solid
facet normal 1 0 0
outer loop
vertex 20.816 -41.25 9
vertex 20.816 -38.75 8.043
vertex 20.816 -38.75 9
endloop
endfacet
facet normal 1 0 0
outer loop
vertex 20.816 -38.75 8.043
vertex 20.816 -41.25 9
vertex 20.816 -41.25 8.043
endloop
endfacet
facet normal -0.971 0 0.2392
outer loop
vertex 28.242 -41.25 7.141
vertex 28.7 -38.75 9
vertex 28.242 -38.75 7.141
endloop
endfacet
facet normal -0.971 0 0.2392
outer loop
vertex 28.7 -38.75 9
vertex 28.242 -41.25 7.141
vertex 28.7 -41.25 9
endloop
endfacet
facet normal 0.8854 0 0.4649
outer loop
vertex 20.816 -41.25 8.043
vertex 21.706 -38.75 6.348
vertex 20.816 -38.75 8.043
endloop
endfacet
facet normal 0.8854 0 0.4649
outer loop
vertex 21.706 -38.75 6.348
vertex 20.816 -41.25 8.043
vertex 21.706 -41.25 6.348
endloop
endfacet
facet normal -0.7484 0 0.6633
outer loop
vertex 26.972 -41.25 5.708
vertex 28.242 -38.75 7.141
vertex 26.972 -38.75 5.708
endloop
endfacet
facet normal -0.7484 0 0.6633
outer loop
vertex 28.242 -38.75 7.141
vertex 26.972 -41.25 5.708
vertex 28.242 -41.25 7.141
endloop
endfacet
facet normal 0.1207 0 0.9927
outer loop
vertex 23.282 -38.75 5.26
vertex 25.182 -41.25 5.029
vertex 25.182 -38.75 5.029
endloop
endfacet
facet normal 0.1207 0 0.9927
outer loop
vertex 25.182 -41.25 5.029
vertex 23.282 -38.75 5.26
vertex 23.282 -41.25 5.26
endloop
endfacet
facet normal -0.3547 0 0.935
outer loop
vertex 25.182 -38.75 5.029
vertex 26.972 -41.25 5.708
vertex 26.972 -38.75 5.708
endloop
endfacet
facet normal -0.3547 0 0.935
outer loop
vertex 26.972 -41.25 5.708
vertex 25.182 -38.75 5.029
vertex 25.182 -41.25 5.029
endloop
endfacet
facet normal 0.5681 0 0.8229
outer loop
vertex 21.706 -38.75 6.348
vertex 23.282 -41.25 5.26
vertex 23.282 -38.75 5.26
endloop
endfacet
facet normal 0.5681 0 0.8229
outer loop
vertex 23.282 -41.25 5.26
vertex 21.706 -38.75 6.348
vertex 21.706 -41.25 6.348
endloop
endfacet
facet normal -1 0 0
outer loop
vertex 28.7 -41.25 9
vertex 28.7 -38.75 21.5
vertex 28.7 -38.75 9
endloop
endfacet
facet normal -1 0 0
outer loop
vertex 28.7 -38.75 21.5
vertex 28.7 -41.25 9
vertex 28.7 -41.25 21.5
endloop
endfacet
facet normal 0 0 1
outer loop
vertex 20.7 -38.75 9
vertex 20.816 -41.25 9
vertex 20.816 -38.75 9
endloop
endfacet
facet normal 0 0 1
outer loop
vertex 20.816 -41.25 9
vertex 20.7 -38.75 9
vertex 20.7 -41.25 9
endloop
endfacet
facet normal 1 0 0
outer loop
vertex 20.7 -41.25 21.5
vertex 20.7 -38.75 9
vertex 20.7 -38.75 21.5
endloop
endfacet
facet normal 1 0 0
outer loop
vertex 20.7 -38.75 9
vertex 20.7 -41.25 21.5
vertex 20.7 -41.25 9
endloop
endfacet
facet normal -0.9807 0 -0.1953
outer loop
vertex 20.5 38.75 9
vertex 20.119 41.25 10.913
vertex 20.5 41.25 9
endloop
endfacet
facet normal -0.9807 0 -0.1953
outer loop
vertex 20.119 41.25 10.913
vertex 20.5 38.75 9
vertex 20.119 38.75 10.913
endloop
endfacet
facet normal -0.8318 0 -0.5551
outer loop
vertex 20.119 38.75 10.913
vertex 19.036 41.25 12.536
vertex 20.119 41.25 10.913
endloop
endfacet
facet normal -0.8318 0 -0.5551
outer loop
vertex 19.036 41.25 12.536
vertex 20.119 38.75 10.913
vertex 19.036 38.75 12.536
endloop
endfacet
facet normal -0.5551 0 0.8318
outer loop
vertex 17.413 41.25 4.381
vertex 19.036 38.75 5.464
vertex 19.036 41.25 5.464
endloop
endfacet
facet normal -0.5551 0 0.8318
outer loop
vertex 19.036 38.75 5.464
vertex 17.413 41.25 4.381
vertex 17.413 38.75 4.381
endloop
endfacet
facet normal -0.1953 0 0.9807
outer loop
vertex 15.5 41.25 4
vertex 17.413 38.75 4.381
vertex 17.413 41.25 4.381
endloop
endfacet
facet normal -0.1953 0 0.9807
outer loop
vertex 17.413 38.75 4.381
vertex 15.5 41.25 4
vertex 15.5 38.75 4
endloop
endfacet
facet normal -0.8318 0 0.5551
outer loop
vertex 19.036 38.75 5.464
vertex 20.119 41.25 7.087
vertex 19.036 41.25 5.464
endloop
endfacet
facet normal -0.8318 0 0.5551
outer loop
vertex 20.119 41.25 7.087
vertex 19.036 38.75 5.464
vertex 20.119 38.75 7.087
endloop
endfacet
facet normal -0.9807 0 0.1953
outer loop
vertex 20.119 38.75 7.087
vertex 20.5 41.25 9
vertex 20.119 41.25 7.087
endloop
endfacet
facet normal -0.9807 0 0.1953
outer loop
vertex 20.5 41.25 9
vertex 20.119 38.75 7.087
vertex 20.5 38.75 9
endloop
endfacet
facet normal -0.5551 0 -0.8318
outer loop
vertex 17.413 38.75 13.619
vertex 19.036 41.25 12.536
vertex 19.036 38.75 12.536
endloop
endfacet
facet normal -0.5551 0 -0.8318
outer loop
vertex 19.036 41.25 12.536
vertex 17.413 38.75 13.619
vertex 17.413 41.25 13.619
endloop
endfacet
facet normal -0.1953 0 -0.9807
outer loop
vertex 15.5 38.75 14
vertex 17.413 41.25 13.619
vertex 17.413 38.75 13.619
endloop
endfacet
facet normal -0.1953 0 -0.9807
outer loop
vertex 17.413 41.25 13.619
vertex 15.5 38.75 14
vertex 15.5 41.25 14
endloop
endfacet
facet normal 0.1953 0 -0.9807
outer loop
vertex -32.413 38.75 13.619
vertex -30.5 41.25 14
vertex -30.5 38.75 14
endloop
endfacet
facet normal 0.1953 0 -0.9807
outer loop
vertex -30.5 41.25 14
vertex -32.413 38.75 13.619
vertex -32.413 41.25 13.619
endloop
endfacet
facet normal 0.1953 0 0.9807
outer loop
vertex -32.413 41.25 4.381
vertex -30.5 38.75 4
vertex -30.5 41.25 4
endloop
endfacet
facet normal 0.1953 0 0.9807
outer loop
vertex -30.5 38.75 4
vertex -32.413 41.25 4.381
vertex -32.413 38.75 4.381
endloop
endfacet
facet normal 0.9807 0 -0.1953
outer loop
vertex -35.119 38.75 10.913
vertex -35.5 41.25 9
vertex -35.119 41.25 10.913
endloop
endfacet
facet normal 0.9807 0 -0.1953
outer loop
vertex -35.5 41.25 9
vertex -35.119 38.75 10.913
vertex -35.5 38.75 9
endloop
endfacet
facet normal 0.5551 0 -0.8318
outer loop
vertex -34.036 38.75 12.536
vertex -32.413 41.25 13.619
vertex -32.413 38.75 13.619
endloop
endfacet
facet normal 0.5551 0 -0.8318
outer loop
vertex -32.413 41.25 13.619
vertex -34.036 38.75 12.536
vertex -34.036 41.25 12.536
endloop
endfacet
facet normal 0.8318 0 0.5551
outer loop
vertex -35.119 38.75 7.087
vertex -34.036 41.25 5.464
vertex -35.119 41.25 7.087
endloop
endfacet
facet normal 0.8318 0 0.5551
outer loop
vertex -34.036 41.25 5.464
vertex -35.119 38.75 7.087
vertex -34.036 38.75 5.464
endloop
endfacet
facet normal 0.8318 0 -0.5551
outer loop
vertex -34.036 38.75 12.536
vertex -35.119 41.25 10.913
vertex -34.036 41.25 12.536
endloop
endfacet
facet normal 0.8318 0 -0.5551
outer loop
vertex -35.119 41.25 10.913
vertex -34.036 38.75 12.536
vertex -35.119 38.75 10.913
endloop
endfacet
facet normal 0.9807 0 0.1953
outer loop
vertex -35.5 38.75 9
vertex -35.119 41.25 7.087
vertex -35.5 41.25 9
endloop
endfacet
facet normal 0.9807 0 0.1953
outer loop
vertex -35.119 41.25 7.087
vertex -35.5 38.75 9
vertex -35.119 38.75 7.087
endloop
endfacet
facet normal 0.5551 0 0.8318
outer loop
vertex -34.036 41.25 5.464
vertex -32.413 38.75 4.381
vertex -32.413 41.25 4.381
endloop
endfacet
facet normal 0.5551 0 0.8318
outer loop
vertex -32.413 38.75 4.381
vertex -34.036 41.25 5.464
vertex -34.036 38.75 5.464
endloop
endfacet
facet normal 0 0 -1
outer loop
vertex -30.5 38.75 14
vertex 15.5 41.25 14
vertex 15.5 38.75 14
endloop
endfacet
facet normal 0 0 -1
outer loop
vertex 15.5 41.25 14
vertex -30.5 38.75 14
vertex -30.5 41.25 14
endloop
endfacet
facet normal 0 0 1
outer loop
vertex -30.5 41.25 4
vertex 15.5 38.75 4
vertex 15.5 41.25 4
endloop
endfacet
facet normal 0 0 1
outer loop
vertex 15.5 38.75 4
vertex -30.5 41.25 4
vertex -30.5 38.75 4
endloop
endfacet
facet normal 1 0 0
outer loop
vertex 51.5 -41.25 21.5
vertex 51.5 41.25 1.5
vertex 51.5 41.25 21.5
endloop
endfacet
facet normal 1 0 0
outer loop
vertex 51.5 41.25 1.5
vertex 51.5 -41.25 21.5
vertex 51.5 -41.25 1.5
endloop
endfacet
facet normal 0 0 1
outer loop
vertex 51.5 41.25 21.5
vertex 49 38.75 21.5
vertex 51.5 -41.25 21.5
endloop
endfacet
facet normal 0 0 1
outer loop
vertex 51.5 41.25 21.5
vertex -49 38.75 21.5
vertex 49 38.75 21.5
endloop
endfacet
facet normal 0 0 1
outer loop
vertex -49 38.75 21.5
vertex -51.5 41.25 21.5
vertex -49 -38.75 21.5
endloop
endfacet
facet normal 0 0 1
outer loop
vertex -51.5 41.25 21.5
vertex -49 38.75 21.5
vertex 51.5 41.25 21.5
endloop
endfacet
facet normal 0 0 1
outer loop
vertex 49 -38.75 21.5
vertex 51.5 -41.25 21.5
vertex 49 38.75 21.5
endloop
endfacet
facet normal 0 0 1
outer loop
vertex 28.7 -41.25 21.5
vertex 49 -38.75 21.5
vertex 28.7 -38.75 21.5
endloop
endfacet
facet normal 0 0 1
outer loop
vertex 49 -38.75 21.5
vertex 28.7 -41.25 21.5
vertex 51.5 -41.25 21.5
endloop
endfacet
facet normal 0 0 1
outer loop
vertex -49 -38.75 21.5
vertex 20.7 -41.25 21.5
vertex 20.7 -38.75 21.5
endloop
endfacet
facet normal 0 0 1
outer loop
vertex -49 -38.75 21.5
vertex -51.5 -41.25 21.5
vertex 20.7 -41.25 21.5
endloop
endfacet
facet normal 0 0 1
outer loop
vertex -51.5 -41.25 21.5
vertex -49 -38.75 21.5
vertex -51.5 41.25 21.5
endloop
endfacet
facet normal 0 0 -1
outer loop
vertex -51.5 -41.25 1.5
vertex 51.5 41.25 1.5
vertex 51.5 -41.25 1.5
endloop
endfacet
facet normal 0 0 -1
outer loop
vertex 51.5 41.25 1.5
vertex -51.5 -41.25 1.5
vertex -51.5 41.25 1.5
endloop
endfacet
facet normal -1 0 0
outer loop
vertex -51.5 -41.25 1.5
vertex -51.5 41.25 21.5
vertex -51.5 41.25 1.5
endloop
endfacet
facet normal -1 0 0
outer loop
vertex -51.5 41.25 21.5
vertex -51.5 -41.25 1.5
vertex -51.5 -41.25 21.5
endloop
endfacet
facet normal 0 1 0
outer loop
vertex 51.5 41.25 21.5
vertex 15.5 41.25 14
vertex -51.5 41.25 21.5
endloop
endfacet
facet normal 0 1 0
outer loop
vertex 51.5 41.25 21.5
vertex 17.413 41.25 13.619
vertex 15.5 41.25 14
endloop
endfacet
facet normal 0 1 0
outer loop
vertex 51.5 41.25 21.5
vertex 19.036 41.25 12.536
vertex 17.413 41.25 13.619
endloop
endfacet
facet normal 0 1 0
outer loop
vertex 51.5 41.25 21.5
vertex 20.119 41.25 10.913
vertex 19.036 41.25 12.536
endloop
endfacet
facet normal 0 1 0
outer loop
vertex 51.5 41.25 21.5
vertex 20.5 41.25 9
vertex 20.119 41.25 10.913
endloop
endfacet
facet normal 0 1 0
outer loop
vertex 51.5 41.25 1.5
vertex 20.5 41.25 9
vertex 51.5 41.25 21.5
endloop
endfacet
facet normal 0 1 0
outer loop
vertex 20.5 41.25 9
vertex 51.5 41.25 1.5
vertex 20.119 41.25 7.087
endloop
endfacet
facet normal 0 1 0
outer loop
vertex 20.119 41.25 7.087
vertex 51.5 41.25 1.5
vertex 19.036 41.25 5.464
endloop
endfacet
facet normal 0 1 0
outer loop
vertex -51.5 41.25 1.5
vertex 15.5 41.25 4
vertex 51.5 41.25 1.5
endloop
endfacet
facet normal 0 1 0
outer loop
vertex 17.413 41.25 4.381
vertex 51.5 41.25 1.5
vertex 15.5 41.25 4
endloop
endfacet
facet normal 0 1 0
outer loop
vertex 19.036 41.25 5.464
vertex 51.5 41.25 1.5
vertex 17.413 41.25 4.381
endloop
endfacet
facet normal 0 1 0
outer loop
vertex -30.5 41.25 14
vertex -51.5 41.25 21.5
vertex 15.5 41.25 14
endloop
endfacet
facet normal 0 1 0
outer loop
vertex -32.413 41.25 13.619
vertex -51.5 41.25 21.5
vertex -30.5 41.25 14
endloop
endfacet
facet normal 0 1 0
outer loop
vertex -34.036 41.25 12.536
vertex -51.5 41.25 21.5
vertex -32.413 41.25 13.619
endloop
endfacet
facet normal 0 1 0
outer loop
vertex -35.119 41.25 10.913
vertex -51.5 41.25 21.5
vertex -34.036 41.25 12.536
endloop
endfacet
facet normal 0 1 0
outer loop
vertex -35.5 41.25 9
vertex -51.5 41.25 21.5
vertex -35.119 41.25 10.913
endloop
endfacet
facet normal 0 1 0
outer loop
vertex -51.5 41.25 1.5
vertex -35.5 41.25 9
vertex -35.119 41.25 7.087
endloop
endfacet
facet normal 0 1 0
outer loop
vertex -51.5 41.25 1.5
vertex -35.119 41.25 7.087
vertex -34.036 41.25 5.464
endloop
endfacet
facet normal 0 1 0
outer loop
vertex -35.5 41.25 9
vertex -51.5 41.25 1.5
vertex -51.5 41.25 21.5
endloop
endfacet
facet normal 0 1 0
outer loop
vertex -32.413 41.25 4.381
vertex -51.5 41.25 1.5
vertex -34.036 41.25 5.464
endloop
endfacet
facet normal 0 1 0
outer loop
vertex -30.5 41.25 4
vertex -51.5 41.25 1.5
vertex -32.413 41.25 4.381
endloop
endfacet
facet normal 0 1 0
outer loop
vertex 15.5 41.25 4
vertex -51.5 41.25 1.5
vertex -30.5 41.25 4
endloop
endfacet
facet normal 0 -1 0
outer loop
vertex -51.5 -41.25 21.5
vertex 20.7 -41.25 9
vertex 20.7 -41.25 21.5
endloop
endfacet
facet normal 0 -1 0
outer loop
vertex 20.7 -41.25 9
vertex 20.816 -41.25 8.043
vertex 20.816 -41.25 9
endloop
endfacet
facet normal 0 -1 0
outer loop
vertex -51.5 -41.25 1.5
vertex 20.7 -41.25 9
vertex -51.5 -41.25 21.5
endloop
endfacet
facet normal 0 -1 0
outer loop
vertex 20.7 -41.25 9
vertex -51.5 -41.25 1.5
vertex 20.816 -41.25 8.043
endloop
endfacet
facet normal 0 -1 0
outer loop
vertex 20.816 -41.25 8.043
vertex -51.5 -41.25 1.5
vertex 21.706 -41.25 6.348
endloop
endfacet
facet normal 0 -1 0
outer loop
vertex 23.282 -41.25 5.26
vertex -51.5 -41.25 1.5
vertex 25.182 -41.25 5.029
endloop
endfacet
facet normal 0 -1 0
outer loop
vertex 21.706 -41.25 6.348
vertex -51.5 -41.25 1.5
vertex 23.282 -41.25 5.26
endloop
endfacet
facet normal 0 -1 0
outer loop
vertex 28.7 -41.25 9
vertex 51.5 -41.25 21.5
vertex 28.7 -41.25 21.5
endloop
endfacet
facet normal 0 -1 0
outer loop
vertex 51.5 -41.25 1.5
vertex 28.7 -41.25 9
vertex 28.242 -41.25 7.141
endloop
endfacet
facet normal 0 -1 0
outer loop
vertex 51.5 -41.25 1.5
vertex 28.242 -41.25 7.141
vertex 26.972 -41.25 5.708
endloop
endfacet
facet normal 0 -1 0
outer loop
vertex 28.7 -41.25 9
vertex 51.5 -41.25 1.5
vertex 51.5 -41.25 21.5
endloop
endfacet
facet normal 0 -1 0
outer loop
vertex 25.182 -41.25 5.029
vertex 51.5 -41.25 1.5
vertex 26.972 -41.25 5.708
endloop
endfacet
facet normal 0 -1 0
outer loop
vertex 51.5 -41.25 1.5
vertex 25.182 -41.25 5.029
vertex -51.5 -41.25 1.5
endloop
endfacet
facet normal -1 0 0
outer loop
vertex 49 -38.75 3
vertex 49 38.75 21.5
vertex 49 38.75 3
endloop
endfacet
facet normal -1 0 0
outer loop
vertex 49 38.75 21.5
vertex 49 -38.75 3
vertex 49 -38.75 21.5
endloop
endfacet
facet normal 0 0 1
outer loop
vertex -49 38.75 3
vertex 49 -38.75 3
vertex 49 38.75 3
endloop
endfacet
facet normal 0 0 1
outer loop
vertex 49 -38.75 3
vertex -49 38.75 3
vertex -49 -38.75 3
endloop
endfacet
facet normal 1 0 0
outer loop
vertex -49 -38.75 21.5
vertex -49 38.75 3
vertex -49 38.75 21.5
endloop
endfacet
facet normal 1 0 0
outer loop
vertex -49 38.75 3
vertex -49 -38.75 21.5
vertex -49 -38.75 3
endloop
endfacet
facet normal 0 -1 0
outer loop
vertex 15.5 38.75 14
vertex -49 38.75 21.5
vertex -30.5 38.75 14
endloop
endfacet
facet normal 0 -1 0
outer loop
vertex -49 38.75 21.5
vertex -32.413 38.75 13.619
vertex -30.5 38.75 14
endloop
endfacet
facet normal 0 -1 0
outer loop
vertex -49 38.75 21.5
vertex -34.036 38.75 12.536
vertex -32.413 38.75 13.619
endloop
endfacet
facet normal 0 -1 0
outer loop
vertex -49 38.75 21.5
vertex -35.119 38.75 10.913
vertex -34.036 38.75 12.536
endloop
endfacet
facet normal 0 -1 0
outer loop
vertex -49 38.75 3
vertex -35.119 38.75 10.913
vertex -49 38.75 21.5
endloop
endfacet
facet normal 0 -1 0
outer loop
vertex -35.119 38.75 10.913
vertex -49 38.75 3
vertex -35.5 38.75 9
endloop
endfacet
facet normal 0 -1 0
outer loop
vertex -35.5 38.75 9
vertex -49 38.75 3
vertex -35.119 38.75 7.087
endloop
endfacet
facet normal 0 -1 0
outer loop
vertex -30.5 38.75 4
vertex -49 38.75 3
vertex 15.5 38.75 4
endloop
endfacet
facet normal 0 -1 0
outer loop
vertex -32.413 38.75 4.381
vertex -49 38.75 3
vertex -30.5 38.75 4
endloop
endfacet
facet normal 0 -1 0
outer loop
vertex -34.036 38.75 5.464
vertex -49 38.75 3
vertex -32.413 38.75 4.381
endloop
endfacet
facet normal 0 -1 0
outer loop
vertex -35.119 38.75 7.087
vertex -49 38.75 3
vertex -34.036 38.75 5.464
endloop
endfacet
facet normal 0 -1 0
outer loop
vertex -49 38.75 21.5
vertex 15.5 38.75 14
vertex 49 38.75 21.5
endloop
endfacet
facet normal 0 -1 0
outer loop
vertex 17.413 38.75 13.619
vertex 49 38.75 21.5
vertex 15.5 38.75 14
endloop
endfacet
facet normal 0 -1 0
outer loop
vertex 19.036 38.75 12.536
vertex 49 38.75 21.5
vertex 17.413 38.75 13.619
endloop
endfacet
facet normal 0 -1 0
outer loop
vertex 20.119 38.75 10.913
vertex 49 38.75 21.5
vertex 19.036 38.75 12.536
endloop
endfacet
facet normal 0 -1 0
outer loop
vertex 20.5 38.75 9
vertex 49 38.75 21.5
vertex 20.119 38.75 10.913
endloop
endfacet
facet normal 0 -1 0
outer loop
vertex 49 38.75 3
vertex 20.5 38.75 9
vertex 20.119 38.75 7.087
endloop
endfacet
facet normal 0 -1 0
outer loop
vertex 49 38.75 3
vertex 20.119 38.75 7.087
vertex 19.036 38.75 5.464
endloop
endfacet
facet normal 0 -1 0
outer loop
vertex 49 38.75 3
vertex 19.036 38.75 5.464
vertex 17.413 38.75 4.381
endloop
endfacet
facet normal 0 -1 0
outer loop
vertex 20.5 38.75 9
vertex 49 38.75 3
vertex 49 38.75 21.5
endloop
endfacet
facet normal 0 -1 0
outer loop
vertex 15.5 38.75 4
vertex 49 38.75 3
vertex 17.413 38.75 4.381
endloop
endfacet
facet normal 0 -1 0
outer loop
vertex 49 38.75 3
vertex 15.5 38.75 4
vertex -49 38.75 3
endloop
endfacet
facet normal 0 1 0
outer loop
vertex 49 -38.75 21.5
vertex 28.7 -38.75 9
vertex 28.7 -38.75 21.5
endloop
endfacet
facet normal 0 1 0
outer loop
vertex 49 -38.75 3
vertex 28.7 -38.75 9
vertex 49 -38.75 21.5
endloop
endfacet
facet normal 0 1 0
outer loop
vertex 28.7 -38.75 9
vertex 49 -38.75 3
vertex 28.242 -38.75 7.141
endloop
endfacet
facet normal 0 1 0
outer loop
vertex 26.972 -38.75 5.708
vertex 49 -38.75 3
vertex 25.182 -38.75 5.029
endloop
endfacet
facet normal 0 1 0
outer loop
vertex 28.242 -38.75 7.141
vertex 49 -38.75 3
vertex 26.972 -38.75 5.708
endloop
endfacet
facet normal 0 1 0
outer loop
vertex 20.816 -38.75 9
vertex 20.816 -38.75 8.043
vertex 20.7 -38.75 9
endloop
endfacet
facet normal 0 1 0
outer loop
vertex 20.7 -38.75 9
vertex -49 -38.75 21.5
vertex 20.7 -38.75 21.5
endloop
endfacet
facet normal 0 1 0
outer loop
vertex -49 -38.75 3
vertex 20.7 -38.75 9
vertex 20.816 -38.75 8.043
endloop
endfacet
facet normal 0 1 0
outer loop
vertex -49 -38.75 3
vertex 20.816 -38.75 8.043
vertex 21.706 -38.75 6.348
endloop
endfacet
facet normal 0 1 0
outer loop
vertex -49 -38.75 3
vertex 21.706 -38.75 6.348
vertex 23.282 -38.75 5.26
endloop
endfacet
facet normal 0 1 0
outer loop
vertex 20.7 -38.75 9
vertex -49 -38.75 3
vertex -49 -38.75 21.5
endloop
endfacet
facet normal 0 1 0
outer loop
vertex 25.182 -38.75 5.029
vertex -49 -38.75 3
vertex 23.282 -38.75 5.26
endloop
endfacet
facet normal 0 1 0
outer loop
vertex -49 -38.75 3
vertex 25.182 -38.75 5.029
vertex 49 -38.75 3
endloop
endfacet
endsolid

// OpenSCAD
module case(){
difference(){
translate([0,0,23/2])cube([95+6+2,72+6+2+2.5,20],center=true);
translate([0,0,23/2+1.5])cube([95+3,72+3+2.5,20],center=true);

translate([24.7,-72/2-3,5+4])
union(){
rotate([90,0,0]) cylinder(r=4,h=5,center=true);
translate([0,0,15/2]) cube([8,5,15],center=true);
}//union

translate([-(47.5-40),72/2+3,5+4])
union(){
translate([+(27-4),0,0])rotate([90,0,0]) cylinder(r=5,h=5,center=true);
translate([-(27-4),0,0])rotate([90,0,0]) cylinder(r=5,h=5,center=true);
cube([27*2-8,5,10],center=true);
}//union
}//diffrence
}//module

case();
